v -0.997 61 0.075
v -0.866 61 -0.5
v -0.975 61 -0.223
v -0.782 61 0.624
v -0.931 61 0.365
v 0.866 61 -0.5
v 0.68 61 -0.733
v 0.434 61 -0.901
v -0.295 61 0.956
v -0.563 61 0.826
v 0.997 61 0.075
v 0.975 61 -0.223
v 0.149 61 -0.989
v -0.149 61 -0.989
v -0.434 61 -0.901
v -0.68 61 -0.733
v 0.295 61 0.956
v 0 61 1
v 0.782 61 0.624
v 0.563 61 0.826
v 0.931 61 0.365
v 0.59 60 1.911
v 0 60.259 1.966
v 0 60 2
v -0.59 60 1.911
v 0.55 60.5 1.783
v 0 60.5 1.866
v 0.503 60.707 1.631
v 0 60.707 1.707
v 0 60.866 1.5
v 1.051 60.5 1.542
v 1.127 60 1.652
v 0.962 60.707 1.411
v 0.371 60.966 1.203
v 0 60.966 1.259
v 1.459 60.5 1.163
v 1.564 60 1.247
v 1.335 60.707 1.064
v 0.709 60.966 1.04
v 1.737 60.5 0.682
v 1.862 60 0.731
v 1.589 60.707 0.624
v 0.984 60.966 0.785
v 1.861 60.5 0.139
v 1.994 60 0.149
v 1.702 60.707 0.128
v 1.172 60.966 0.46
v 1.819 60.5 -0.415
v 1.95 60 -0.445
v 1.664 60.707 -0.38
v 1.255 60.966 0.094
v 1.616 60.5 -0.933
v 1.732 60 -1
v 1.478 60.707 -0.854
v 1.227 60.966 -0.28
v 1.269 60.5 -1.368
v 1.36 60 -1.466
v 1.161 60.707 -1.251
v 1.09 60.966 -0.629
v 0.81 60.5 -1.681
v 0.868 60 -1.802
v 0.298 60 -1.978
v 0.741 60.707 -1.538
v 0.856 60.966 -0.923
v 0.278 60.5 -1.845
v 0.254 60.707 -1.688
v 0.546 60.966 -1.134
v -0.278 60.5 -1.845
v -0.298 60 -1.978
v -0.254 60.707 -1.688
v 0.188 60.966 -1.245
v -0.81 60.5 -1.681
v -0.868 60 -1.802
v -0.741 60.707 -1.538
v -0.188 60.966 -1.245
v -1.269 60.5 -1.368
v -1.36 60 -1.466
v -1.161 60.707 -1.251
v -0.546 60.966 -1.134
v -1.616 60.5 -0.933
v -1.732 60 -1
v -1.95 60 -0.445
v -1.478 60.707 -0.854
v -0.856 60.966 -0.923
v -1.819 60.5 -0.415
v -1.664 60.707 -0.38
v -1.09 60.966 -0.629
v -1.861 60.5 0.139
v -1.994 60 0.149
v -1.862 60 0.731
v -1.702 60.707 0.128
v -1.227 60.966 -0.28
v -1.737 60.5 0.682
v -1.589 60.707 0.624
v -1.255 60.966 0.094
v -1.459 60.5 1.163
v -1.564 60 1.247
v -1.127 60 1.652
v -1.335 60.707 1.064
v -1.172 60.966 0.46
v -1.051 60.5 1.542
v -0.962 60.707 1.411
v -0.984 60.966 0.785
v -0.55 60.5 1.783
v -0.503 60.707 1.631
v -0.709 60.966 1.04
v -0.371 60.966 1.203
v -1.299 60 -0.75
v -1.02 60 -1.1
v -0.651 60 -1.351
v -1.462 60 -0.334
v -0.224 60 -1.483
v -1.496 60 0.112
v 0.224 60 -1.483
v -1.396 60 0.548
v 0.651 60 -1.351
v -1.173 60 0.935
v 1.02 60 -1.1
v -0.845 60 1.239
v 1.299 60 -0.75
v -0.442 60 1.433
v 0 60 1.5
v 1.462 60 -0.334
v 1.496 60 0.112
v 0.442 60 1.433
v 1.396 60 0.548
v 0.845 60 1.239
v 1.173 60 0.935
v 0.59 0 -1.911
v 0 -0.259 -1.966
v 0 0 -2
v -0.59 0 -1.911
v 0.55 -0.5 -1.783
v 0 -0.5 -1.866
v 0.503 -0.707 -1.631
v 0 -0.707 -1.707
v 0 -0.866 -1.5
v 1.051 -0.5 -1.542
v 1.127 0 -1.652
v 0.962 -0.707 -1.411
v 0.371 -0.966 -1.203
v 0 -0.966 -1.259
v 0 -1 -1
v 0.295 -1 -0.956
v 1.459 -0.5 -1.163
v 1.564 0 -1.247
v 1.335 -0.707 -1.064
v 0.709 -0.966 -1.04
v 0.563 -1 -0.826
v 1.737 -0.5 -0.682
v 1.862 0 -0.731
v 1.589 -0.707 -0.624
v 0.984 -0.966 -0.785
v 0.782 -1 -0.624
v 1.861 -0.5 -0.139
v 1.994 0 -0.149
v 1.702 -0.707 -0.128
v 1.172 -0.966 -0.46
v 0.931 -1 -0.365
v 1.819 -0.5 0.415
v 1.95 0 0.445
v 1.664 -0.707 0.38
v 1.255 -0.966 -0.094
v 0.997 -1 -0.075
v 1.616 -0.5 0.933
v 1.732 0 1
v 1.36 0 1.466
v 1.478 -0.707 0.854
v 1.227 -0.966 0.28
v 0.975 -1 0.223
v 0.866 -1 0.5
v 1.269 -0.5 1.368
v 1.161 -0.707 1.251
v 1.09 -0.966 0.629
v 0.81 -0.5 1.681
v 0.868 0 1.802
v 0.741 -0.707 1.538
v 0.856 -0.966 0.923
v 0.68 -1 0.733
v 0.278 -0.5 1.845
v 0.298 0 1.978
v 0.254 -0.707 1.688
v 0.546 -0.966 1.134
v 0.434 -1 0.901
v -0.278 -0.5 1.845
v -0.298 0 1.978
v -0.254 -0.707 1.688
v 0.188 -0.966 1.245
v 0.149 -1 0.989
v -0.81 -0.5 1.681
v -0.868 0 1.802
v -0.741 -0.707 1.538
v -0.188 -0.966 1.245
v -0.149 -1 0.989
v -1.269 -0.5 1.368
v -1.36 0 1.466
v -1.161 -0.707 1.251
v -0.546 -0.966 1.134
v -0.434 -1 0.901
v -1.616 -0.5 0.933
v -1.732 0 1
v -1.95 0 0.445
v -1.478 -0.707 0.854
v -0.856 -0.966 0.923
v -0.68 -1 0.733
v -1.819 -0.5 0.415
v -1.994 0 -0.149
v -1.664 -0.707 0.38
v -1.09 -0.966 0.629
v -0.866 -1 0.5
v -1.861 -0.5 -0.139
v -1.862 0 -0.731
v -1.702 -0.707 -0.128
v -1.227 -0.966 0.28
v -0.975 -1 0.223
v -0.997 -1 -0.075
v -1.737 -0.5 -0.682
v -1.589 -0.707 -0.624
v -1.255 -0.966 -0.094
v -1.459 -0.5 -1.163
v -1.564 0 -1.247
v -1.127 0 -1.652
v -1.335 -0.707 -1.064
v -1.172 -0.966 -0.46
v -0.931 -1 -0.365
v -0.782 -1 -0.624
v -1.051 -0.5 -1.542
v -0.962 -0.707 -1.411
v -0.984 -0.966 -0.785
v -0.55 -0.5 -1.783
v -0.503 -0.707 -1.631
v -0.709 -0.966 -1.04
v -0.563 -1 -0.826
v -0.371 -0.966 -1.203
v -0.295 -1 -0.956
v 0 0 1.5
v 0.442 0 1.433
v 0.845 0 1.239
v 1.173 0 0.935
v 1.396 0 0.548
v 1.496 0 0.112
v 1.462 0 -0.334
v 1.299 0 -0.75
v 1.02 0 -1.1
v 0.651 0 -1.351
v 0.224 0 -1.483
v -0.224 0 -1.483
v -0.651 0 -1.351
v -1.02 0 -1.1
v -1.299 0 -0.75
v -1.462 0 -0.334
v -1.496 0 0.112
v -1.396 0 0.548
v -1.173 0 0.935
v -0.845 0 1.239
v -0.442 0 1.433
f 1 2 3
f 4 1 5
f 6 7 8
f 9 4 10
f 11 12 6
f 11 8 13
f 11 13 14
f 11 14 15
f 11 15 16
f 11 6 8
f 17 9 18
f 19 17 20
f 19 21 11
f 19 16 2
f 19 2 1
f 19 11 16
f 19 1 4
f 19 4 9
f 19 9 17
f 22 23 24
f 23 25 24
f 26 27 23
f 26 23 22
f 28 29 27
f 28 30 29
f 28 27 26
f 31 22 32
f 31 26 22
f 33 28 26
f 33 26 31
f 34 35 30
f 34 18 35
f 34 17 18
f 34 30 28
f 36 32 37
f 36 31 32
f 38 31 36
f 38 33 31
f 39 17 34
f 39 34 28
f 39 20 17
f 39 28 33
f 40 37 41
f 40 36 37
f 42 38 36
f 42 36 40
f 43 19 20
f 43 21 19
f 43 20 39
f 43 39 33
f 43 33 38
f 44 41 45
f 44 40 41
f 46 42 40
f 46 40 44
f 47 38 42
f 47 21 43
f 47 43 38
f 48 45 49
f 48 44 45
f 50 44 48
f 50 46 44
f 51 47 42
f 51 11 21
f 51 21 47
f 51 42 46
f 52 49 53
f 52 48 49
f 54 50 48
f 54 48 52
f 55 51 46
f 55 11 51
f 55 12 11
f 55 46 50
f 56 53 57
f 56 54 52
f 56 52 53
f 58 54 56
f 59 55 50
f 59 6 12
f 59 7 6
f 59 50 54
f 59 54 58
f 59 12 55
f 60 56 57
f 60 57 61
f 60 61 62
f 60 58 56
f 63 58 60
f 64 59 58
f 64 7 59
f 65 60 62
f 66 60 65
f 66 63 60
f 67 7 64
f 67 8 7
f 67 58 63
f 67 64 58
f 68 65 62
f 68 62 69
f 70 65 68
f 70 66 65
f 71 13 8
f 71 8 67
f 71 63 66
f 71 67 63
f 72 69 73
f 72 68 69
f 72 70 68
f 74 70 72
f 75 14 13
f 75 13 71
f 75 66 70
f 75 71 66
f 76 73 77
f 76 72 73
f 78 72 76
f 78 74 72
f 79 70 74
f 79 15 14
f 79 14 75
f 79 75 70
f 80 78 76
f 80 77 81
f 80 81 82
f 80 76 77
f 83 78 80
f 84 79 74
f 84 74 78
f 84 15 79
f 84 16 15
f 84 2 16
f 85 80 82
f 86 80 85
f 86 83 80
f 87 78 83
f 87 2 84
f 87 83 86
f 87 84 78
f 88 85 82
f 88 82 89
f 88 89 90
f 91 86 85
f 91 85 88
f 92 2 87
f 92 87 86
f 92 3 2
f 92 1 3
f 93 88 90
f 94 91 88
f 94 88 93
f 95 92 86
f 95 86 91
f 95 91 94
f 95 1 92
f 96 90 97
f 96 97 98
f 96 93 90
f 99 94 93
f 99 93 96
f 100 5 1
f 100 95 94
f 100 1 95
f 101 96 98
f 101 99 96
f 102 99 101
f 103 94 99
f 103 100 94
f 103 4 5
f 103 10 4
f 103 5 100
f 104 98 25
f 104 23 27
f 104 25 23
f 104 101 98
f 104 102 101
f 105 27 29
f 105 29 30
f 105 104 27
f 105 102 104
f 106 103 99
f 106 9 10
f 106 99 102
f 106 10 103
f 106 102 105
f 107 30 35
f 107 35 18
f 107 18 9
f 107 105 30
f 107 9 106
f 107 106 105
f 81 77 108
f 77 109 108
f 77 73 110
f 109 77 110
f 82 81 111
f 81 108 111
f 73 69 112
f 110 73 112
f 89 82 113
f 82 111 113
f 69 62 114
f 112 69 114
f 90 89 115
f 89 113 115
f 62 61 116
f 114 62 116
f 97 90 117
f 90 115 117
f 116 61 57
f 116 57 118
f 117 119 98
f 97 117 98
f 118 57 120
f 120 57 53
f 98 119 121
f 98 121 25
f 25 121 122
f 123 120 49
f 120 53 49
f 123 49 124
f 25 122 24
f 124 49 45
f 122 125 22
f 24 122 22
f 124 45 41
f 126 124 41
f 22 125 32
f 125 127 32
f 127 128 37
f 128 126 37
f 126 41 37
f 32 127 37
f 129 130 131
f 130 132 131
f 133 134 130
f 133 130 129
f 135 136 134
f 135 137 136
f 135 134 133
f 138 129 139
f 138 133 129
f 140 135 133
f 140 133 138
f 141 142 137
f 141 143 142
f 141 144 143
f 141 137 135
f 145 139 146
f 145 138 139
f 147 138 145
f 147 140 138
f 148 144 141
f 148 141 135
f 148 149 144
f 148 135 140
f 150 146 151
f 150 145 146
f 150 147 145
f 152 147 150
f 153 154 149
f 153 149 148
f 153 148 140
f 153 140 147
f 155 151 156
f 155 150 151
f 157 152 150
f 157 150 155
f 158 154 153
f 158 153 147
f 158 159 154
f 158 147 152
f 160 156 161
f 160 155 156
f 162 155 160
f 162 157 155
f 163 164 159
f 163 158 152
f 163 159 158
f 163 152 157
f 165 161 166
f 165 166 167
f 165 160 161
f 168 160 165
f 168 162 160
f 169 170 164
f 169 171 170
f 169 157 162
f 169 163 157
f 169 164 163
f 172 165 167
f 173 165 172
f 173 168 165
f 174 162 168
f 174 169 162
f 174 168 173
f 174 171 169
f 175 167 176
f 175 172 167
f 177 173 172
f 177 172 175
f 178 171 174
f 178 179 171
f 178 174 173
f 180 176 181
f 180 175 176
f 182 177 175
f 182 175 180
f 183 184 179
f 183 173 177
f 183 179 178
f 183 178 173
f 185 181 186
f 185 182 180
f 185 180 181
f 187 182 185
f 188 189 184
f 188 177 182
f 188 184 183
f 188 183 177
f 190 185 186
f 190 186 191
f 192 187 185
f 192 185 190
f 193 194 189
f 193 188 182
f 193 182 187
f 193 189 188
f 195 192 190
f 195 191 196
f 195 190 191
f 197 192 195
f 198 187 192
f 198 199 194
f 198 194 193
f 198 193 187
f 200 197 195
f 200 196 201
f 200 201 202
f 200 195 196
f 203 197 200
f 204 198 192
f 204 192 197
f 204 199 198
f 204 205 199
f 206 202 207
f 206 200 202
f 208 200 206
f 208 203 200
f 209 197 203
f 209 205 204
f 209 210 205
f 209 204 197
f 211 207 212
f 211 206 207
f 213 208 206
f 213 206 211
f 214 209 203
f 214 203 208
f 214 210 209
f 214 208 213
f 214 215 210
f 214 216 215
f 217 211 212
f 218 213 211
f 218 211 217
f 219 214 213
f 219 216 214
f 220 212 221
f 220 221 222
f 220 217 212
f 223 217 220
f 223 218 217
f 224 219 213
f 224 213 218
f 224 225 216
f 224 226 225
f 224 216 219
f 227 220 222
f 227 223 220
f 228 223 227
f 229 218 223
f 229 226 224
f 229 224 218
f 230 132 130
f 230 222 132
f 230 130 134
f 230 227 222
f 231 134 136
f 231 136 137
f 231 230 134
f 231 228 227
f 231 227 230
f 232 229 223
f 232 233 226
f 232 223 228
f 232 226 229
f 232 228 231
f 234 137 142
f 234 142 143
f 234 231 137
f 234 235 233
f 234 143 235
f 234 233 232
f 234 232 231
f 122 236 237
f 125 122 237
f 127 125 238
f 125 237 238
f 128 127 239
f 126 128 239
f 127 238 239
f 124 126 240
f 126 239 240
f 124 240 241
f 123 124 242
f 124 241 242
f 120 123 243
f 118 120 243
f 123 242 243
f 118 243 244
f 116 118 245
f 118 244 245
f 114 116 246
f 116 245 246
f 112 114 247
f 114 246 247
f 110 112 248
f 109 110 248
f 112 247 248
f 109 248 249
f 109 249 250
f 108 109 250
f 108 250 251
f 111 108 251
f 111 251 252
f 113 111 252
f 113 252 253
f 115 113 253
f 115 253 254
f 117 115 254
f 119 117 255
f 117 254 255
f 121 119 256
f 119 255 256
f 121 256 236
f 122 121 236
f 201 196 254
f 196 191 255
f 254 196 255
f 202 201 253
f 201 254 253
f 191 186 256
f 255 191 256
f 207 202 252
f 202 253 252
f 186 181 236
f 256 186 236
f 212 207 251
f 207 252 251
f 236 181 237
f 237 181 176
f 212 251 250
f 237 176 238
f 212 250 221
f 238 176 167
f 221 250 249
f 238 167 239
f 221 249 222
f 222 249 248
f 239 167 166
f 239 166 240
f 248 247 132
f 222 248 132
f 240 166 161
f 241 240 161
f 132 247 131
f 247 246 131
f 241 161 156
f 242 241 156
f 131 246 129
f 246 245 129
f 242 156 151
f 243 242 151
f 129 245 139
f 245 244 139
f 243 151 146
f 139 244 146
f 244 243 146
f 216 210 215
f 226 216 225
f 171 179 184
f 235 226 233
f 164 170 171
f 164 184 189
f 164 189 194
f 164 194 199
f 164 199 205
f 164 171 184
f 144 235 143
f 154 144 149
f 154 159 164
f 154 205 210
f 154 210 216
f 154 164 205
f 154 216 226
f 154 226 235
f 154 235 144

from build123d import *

# Parameters (mm, degrees)
SZKIC1_R                    = 1.5
DODANIE_WYCI_GNI_CIE1_DEPTH = 60
SZKIC2_R                    = 2
DODANIE_WYCI_GNI_CIE2_DEPTH = 1
ZAOKR_GLENIE1_R             = 1
DODANIE_WYCI_GNI_CIE3_START = 1
SZKIC3_R                    = 2
DODANIE_WYCI_GNI_CIE3_DEPTH = 1
ZAOKR_GLENIE2_R             = 1


with BuildPart() as part:
    # Szkic1 → Dodanie-wyciągnięcie1 (new body)
    with BuildSketch(Plane(origin=(0, 0, 0), x_dir=(1, 0, 0), z_dir=(0, 1, 0))):
        with Locations(Location((0, 0, 0), (0, 0, 270))):
            Circle(SZKIC1_R)
    extrude(amount=DODANIE_WYCI_GNI_CIE1_DEPTH)

    # Szkic2 → Dodanie-wyciągnięcie2 (add)
    with BuildSketch(Plane(origin=(0, 60, 0), x_dir=(1, 0, 0), z_dir=(0, 1, 0))):
        with Locations(Location((0, 0, 0), (0, 0, 270))):
            Circle(SZKIC2_R)
    extrude(amount=DODANIE_WYCI_GNI_CIE2_DEPTH)

    # Zaokrąglenie1
    zaokr_glenie1_edges = [part.edges().sort_by_distance(p)[0] for p in [
        (0, 61, -2),
    ]]
    fillet(zaokr_glenie1_edges, radius=ZAOKR_GLENIE1_R - 0.0001)  # a hair under: the kernel refuses the full size

    # Szkic3 → Dodanie-wyciągnięcie3 (add)
    with BuildSketch(Plane.XZ.offset(DODANIE_WYCI_GNI_CIE3_START)):
        with Locations(Location((0, 0, 0), (0, 0, 270))):
            Circle(SZKIC3_R)
    extrude(amount=-DODANIE_WYCI_GNI_CIE3_DEPTH)

    # Zaokrąglenie2
    zaokr_glenie2_edges = [part.edges().sort_by_distance(p)[0] for p in [
        (0, -1, 2),
    ]]
    fillet(zaokr_glenie2_edges, radius=ZAOKR_GLENIE2_R - 0.0001)  # a hair under: the kernel refuses the full size


solid = part.part
